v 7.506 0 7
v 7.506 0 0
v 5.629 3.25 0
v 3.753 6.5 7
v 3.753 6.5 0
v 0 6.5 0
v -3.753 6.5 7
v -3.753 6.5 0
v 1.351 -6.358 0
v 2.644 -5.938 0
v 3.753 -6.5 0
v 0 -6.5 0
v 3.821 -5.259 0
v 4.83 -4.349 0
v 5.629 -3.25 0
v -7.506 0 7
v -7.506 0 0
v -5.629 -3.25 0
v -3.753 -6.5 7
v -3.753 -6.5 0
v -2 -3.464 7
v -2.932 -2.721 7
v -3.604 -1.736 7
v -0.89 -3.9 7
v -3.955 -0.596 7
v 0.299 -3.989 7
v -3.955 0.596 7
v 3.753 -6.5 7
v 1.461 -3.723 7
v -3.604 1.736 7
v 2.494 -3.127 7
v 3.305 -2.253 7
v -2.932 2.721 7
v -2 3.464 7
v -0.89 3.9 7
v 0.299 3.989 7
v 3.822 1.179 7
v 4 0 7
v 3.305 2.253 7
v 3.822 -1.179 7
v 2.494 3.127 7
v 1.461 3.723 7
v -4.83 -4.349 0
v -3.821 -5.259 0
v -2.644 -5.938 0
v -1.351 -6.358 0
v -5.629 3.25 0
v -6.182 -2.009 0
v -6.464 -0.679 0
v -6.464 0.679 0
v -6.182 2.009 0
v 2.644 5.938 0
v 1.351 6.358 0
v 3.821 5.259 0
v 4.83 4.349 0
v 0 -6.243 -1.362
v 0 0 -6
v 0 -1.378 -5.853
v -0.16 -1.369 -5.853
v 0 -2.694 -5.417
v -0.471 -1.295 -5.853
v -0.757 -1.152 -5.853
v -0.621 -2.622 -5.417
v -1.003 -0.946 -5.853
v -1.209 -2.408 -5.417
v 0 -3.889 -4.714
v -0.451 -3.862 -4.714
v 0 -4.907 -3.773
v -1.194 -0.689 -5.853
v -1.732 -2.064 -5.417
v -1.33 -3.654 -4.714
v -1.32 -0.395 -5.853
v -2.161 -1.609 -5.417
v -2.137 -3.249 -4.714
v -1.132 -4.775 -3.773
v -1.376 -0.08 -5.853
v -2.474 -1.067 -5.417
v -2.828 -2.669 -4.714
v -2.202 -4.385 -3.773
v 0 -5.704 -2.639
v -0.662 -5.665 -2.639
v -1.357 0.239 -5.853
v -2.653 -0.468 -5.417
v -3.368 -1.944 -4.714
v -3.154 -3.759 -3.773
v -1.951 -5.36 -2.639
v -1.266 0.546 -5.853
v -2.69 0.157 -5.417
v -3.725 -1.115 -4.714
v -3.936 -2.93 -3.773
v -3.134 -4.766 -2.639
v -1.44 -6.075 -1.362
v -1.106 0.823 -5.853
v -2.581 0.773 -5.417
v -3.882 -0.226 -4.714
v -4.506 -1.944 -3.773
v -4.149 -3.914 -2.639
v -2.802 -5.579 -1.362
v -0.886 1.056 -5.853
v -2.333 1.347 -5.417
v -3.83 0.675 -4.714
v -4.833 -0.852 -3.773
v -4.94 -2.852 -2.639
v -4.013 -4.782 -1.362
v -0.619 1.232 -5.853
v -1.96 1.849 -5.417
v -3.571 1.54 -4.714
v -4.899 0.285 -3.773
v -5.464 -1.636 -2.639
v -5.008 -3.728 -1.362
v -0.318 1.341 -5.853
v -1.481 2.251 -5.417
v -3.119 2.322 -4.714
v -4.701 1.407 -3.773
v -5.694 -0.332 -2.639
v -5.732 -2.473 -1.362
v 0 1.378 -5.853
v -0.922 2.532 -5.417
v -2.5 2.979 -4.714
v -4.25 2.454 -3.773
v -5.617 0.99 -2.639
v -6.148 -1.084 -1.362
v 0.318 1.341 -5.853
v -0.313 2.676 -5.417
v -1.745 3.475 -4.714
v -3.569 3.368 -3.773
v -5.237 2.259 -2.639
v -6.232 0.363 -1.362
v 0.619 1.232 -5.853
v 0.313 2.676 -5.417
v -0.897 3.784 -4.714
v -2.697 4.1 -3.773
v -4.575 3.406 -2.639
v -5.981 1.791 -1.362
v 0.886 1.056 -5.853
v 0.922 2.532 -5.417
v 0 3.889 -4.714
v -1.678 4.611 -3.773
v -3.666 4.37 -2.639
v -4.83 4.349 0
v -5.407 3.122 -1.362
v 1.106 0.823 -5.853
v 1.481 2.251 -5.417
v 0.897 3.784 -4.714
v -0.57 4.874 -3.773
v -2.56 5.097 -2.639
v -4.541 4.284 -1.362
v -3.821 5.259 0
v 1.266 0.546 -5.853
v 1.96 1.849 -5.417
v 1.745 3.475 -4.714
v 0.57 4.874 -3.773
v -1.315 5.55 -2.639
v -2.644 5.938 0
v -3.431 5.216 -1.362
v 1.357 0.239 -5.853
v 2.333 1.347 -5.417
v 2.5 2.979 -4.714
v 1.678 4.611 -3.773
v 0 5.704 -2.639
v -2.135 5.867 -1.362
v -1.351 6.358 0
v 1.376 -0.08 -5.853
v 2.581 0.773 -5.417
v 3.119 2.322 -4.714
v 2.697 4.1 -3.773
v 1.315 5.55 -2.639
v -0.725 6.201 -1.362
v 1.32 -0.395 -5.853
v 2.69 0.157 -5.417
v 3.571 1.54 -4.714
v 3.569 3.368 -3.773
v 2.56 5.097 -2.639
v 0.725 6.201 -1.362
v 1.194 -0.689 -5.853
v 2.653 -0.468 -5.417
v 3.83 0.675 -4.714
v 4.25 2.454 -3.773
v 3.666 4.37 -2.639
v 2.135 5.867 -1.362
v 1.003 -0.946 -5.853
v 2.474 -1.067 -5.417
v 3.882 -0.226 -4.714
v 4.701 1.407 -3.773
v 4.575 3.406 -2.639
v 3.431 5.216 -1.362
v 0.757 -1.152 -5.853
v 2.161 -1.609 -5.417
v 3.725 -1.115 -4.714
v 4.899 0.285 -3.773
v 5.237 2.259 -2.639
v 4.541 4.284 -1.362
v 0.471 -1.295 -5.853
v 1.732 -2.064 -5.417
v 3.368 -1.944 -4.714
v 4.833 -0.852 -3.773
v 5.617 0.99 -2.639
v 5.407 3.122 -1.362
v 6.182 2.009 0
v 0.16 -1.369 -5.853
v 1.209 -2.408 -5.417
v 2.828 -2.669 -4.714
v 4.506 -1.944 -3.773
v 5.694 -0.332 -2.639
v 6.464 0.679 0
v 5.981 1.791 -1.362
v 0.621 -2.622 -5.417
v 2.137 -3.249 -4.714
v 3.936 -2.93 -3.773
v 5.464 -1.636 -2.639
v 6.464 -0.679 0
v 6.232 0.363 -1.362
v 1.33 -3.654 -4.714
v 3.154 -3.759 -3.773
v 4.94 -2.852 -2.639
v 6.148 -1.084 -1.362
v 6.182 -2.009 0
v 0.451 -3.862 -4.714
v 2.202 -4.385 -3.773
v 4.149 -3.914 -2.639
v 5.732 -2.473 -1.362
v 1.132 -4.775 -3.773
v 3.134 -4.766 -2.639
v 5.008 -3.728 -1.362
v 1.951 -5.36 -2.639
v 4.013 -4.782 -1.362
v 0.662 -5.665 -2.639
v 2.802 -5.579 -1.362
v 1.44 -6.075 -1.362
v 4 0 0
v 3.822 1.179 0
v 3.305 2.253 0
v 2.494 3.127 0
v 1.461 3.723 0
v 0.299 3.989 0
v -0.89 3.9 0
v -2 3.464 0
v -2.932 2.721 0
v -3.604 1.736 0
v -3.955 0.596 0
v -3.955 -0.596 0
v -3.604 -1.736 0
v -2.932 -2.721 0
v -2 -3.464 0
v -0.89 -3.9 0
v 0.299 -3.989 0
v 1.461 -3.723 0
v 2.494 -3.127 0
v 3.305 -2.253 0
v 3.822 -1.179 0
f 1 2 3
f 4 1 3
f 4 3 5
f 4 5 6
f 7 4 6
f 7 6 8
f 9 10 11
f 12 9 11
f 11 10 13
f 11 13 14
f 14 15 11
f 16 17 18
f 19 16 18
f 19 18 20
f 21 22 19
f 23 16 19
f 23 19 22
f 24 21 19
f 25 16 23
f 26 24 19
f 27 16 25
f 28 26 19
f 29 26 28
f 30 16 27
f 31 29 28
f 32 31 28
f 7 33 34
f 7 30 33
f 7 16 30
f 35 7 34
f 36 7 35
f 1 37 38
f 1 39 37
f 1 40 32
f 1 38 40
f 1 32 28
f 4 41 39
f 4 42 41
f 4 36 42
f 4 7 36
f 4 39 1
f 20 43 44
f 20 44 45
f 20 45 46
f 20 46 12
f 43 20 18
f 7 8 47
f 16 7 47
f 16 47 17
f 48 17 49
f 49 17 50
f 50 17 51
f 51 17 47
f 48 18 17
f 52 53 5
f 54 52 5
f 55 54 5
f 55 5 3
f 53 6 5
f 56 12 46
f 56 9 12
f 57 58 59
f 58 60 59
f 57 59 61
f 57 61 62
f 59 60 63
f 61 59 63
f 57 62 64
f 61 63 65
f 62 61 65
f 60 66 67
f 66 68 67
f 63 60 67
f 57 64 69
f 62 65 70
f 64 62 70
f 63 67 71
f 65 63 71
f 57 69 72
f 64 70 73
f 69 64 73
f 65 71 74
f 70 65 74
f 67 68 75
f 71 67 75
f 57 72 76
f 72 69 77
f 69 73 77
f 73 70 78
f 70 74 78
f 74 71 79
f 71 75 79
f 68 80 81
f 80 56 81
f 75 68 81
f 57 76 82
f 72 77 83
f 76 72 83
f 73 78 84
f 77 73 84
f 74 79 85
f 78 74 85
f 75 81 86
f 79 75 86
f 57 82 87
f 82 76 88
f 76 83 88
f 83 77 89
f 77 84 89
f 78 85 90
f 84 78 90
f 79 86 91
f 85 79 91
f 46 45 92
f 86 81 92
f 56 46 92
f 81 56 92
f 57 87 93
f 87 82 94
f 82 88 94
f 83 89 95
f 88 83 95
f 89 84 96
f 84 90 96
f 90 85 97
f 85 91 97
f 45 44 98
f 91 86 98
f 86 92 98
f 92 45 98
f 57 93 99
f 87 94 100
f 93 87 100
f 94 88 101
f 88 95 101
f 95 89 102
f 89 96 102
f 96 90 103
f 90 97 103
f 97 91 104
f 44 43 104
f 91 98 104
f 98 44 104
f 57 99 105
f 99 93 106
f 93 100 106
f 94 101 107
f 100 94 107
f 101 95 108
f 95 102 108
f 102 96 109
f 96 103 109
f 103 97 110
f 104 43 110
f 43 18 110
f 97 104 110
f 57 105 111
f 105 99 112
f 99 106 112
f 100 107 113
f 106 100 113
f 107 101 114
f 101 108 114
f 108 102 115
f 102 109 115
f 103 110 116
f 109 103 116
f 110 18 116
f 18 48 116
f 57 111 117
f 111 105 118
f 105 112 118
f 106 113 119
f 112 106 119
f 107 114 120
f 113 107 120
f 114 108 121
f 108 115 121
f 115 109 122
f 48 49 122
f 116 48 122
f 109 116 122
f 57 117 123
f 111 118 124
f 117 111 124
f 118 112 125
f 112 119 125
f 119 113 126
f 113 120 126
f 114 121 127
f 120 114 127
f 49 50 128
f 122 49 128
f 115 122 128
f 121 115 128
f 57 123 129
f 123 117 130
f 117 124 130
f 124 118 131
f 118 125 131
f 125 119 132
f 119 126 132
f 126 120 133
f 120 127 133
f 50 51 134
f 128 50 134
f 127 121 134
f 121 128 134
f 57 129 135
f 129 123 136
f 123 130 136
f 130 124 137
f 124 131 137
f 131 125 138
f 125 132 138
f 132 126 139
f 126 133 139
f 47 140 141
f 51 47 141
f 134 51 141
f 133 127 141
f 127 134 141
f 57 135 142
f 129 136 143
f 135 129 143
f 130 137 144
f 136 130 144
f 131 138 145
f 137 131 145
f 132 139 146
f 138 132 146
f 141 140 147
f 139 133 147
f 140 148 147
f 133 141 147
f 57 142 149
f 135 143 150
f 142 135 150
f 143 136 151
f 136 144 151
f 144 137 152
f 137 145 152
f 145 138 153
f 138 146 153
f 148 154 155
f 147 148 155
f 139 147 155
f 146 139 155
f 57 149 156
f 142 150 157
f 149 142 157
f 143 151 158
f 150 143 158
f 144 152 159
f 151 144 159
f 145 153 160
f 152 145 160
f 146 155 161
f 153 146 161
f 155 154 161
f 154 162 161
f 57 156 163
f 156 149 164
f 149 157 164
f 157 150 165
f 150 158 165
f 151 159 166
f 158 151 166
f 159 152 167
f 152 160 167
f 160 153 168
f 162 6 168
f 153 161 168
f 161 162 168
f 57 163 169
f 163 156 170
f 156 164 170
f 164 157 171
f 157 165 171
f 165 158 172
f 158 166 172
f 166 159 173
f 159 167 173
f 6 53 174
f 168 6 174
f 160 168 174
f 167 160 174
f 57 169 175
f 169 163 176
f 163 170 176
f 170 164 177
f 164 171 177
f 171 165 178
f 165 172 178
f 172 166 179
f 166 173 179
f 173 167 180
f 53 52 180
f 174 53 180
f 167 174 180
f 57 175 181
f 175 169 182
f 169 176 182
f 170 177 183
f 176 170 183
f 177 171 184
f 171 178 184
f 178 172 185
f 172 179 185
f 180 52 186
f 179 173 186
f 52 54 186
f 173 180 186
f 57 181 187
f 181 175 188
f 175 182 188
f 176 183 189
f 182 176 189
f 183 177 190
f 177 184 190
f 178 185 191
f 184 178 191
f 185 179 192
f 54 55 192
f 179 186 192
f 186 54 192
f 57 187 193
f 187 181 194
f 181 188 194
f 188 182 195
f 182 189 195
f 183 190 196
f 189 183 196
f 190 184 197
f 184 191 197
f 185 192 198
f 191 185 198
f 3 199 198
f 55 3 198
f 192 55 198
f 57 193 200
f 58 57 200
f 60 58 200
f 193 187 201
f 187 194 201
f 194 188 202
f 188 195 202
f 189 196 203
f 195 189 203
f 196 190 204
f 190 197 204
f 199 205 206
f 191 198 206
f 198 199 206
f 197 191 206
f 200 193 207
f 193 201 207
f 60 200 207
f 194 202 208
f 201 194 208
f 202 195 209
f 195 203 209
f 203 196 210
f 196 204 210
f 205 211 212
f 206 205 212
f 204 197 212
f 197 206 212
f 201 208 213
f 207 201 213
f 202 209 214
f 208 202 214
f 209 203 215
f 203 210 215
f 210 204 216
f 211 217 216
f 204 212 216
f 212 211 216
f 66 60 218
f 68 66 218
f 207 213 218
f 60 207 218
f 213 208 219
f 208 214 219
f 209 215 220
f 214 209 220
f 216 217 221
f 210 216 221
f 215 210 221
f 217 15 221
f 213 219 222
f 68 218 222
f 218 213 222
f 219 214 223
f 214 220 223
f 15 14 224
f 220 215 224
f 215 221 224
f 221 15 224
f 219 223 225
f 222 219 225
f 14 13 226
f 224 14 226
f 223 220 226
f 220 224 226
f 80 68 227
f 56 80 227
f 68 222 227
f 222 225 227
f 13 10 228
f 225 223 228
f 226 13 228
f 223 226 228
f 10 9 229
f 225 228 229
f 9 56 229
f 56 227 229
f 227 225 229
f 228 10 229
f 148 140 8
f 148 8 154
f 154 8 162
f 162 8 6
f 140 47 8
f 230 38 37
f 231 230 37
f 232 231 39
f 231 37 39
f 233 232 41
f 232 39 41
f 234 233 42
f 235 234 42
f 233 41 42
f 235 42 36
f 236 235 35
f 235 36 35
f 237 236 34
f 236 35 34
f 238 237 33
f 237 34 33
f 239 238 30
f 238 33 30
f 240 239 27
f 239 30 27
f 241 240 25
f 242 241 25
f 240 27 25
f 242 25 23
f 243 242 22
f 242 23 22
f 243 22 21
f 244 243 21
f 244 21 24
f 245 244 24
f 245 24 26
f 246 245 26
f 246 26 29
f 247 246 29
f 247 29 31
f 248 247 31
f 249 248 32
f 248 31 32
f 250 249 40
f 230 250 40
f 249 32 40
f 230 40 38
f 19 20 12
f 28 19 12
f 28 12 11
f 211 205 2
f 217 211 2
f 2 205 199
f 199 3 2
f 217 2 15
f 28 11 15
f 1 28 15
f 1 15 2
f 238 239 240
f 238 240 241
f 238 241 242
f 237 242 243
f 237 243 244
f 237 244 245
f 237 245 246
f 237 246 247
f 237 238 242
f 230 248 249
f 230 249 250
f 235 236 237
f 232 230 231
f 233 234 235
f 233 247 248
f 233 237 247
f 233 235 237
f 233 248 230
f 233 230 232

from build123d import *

# Parameters (mm, degrees)
SALIENTE_EXTRUIR1_DEPTH = 7
CROQUIS3_R              = 4
CORTAR_EXTRUIR1_DEPTH   = 7


with BuildPart() as part:
    # Croquis1 → Saliente-Extruir1 (new body)
    with BuildSketch(Plane.XY):
        Polygon((7.505553499, 0), (3.75277675, 6.5), (-3.75277675, 6.5), (-7.505553499, 0), (-3.75277675, -6.5), (3.75277675, -6.5), align=None)
    extrude(amount=SALIENTE_EXTRUIR1_DEPTH)

    # Croquis2 → Revolución1 (revolve)
    with BuildSketch(Plane(origin=(0, 0, 0), x_dir=(0, 0, -1), z_dir=(1, 0, 0))):
        with BuildLine():
            Line((0, 0), (6, 0))
            ThreePointArc((6, 0), (4.270697462, -4.422951503), (0, -6.5))
            Line((0, -6.5), (0, 0))
        make_face()
    revolve(axis=Axis((0, 0, 0), (0, 0, -1)))

    # Croquis3 → Cortar-Extruir1 (cut)
    with BuildSketch(Plane.XY.offset(7)):
        Circle(CROQUIS3_R)
    extrude(amount=-CORTAR_EXTRUIR1_DEPTH, mode=Mode.SUBTRACT)


solid = part.part
